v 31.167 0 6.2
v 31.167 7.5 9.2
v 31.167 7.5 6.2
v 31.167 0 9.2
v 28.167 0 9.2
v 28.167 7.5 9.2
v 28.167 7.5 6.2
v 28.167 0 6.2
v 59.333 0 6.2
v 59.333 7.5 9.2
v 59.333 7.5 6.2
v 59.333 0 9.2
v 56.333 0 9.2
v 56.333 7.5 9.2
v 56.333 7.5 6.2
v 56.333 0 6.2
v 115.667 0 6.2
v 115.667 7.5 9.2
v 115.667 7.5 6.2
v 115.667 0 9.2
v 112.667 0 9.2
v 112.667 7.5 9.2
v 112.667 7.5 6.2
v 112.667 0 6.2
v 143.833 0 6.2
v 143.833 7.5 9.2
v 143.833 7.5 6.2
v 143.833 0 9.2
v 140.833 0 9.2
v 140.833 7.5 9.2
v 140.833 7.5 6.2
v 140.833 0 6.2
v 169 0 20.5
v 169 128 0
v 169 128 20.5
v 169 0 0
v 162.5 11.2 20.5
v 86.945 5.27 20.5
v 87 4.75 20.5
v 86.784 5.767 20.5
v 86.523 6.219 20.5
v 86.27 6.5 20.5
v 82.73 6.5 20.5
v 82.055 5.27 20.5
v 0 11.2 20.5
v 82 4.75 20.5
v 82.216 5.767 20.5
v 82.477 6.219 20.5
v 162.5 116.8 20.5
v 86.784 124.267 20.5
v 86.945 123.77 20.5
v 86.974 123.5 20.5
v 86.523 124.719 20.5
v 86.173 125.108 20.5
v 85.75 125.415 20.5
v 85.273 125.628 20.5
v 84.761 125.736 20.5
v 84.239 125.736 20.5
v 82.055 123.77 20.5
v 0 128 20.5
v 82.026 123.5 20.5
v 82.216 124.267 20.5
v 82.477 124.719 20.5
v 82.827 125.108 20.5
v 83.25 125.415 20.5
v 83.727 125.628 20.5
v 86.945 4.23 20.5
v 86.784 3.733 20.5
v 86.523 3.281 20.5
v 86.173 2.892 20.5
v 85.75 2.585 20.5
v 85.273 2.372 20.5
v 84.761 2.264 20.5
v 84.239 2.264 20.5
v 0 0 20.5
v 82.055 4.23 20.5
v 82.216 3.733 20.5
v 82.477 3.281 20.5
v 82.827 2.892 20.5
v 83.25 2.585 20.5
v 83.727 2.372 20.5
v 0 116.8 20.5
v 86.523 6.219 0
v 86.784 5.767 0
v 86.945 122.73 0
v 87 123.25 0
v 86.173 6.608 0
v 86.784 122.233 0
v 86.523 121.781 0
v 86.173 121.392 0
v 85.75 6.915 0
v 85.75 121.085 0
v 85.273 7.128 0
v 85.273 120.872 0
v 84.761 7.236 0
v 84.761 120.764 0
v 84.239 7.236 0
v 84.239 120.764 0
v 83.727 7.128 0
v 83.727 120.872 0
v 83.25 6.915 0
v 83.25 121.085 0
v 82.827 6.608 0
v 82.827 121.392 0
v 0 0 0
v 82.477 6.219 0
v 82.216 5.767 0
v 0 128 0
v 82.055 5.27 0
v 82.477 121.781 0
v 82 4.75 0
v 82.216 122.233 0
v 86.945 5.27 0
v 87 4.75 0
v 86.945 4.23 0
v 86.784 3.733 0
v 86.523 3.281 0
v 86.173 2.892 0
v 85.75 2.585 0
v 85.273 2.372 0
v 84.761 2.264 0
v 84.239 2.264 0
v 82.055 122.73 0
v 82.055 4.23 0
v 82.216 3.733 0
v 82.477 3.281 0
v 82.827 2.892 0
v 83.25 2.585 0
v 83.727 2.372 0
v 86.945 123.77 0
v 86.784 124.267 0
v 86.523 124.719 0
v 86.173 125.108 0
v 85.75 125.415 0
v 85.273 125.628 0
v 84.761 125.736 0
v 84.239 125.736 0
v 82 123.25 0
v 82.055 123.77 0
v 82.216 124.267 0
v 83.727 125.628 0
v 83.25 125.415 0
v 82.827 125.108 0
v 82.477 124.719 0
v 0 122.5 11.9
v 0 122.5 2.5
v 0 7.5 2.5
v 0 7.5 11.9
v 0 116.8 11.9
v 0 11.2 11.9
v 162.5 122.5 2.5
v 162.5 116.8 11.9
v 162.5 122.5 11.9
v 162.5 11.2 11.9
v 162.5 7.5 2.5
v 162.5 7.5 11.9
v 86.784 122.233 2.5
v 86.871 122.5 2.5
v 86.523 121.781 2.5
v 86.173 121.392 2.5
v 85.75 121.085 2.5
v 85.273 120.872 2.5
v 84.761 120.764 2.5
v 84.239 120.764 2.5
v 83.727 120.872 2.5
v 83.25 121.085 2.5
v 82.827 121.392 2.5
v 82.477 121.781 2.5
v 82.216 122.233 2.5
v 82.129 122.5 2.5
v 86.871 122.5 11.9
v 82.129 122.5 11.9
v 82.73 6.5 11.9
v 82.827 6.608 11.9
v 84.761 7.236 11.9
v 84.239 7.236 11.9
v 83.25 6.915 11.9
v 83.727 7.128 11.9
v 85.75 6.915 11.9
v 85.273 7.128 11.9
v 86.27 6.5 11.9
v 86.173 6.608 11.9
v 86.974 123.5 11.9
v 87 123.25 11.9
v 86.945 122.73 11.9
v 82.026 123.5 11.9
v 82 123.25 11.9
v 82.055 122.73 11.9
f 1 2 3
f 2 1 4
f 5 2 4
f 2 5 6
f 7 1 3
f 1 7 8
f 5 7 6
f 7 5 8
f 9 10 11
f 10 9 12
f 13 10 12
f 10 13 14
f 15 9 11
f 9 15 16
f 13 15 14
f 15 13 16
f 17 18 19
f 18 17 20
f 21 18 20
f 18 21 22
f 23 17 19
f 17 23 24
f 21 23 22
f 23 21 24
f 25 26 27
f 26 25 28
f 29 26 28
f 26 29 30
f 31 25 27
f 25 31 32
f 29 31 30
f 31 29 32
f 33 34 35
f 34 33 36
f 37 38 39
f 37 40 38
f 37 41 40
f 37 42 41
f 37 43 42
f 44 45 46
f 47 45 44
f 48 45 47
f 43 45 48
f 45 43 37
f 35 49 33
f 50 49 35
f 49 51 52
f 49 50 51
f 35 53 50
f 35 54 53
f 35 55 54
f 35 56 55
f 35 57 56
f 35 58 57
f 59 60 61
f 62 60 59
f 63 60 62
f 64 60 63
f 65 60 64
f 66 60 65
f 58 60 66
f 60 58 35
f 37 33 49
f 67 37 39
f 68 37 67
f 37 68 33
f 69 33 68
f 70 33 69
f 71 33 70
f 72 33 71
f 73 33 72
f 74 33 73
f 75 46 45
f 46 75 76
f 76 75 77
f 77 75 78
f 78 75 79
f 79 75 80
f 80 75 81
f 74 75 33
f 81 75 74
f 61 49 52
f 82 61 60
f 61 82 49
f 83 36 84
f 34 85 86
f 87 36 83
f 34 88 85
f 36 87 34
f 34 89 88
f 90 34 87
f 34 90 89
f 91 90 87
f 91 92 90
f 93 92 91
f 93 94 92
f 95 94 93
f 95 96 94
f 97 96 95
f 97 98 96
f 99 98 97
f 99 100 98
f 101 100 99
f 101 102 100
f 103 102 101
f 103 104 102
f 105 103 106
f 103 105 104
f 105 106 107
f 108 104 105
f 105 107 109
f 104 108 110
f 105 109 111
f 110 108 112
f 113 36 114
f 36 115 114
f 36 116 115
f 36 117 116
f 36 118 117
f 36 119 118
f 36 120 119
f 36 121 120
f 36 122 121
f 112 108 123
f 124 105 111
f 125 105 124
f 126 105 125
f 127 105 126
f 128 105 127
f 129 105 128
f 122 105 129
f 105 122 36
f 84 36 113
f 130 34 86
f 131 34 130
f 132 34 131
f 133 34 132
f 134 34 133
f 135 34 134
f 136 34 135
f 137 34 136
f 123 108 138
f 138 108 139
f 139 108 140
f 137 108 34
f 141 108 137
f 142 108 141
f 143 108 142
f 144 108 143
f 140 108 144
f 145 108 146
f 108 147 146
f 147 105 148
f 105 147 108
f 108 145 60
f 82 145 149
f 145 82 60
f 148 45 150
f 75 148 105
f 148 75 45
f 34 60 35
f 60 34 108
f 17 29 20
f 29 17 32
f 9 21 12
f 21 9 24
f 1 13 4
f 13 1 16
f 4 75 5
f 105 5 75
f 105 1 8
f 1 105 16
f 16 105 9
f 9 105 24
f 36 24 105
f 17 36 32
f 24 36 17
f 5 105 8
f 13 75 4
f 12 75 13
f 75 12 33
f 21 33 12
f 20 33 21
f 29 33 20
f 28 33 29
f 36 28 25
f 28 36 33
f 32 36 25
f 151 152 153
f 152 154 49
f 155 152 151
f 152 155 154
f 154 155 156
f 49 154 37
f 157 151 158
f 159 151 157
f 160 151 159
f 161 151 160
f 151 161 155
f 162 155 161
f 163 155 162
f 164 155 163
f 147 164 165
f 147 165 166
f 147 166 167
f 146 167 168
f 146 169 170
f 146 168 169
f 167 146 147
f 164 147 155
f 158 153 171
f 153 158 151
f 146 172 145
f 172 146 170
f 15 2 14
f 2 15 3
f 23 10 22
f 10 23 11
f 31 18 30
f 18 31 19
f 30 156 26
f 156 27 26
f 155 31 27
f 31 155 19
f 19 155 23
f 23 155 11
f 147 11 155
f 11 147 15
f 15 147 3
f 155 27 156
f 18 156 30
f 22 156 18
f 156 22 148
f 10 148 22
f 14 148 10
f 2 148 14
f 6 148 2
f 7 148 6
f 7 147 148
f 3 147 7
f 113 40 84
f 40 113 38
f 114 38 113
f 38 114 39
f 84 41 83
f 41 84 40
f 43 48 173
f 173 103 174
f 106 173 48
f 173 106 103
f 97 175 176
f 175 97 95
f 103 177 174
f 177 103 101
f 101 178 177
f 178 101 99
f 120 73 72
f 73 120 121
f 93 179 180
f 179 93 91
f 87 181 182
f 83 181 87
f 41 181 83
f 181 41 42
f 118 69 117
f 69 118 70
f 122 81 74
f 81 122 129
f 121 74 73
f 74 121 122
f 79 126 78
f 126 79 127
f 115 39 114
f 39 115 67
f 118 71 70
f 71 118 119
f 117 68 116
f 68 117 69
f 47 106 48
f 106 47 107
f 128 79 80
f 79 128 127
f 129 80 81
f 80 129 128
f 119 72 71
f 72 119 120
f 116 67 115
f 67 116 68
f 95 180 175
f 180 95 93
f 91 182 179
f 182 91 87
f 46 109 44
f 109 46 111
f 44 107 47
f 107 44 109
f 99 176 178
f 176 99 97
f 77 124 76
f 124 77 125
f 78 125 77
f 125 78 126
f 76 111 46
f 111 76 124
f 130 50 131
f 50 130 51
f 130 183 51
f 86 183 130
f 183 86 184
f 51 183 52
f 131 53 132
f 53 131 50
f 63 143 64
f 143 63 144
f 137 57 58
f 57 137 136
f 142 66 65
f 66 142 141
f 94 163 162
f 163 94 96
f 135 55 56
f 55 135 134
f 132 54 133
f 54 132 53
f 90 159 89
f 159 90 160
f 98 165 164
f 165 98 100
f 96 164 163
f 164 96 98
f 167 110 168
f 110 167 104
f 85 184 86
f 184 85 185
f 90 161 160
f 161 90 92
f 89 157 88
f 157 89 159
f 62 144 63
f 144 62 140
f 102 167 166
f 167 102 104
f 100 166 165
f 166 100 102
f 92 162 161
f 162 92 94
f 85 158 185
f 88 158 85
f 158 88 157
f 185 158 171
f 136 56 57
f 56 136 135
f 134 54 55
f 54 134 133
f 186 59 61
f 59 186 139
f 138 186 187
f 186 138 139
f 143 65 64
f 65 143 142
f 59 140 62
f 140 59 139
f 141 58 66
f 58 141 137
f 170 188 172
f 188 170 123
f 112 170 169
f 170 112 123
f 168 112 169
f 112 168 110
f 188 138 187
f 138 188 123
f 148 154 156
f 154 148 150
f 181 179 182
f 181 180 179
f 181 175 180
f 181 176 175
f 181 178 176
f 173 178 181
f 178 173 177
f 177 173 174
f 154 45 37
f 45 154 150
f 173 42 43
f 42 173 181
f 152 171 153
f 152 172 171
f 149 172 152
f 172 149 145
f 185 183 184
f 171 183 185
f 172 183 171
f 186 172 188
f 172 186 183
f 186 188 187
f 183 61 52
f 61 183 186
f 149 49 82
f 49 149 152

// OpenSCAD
tile_width         = 77;
//tile_width         = 7;
tile_height        = 113;
tile_thickness     = 15.5;
tile_lip_thickness = 7.4;
tile_lip_depth     = 4.7;

width_padding      = 15;
height_padding     = 15;
thickness_padding  = 5;

module tile() {
 difference() {
  color("red") cube(size=[tile_width, tile_height, tile_thickness]);
  translate([-1, 0, tile_lip_thickness]) {
   translate([0, -1, 0])
    cube(size=[tile_width + 2, tile_lip_depth + 1, (tile_thickness - tile_lip_thickness + 1)]);
   translate([0, tile_height - tile_lip_depth, 0])
    cube(size=[tile_width + 2, tile_lip_depth + 1, (tile_thickness - tile_lip_thickness + 1)]);
  }
 }
}

//translate([width_padding / 2 - 0.5, height_padding / 2,thickness_padding / 2 + 1]) {
// tile();
// translate([tile_width + 1, 0, 0]) tile();
//}

outer_width = tile_width * 2 + width_padding;
outer_height = tile_height + height_padding;
outer_thickness = tile_thickness + thickness_padding;
drainage_offset = outer_width / 6;
difference() {
 cube(size=[outer_width, outer_height, outer_thickness]);
 translate([-1, height_padding / 2,thickness_padding / 2])
  #cube(size=[tile_width * 2 + (width_padding / 2) + 2, tile_height + 2, tile_thickness + 25]);
 translate([outer_width / 2,height_padding / 4 + 1,-1])
  #cylinder(r=2.5, h = outer_thickness + 2, $fn=30);
 translate([outer_width / 2,outer_height - (height_padding / 4) - 1,-1])
  #cylinder(r=2.5, h = outer_thickness + 2, $fn=30);
 

 translate([drainage_offset, -1, thickness_padding / 2 + tile_lip_thickness / 2]) {
  cube(size=[3, 20, 3]);
  translate([drainage_offset, 0, 0])
   cube(size=[3, 20, 3]);
  translate([drainage_offset * 3, 0, 0])
   cube(size=[3, 20, 3]);
  translate([drainage_offset * 4, 0, 0])
   cube(size=[3, 20, 3]);
 }
}

translate([0,height_padding/2 - 1,(thickness_padding / 2) + tile_lip_thickness + 2])
 cube(size=[outer_width,tile_lip_depth,outer_thickness - (thickness_padding / 2) - tile_lip_thickness - 2]);
translate([0,outer_height - (height_padding/2) - tile_lip_depth + 1,(thickness_padding / 2) + tile_lip_thickness + 2])
 cube(size=[outer_width,tile_lip_depth + 2,outer_thickness - (thickness_padding / 2) - tile_lip_thickness - 2]);

module end_cap() {
  cube(size=[width_padding / 2 - 2, tile_height + 2, tile_lip_thickness + 2]);
  translate([0, tile_lip_depth, tile_lip_thickness + 2])
   cube(size=[width_padding / 2 - 1, tile_height - (2 * tile_lip_depth), tile_thickness - tile_lip_thickness + 3]);
}

//translate([-20, height_padding / 2, thickness_padding / 2]) {
//translate([-20, 0, 0]) {
// end_cap();
//}
